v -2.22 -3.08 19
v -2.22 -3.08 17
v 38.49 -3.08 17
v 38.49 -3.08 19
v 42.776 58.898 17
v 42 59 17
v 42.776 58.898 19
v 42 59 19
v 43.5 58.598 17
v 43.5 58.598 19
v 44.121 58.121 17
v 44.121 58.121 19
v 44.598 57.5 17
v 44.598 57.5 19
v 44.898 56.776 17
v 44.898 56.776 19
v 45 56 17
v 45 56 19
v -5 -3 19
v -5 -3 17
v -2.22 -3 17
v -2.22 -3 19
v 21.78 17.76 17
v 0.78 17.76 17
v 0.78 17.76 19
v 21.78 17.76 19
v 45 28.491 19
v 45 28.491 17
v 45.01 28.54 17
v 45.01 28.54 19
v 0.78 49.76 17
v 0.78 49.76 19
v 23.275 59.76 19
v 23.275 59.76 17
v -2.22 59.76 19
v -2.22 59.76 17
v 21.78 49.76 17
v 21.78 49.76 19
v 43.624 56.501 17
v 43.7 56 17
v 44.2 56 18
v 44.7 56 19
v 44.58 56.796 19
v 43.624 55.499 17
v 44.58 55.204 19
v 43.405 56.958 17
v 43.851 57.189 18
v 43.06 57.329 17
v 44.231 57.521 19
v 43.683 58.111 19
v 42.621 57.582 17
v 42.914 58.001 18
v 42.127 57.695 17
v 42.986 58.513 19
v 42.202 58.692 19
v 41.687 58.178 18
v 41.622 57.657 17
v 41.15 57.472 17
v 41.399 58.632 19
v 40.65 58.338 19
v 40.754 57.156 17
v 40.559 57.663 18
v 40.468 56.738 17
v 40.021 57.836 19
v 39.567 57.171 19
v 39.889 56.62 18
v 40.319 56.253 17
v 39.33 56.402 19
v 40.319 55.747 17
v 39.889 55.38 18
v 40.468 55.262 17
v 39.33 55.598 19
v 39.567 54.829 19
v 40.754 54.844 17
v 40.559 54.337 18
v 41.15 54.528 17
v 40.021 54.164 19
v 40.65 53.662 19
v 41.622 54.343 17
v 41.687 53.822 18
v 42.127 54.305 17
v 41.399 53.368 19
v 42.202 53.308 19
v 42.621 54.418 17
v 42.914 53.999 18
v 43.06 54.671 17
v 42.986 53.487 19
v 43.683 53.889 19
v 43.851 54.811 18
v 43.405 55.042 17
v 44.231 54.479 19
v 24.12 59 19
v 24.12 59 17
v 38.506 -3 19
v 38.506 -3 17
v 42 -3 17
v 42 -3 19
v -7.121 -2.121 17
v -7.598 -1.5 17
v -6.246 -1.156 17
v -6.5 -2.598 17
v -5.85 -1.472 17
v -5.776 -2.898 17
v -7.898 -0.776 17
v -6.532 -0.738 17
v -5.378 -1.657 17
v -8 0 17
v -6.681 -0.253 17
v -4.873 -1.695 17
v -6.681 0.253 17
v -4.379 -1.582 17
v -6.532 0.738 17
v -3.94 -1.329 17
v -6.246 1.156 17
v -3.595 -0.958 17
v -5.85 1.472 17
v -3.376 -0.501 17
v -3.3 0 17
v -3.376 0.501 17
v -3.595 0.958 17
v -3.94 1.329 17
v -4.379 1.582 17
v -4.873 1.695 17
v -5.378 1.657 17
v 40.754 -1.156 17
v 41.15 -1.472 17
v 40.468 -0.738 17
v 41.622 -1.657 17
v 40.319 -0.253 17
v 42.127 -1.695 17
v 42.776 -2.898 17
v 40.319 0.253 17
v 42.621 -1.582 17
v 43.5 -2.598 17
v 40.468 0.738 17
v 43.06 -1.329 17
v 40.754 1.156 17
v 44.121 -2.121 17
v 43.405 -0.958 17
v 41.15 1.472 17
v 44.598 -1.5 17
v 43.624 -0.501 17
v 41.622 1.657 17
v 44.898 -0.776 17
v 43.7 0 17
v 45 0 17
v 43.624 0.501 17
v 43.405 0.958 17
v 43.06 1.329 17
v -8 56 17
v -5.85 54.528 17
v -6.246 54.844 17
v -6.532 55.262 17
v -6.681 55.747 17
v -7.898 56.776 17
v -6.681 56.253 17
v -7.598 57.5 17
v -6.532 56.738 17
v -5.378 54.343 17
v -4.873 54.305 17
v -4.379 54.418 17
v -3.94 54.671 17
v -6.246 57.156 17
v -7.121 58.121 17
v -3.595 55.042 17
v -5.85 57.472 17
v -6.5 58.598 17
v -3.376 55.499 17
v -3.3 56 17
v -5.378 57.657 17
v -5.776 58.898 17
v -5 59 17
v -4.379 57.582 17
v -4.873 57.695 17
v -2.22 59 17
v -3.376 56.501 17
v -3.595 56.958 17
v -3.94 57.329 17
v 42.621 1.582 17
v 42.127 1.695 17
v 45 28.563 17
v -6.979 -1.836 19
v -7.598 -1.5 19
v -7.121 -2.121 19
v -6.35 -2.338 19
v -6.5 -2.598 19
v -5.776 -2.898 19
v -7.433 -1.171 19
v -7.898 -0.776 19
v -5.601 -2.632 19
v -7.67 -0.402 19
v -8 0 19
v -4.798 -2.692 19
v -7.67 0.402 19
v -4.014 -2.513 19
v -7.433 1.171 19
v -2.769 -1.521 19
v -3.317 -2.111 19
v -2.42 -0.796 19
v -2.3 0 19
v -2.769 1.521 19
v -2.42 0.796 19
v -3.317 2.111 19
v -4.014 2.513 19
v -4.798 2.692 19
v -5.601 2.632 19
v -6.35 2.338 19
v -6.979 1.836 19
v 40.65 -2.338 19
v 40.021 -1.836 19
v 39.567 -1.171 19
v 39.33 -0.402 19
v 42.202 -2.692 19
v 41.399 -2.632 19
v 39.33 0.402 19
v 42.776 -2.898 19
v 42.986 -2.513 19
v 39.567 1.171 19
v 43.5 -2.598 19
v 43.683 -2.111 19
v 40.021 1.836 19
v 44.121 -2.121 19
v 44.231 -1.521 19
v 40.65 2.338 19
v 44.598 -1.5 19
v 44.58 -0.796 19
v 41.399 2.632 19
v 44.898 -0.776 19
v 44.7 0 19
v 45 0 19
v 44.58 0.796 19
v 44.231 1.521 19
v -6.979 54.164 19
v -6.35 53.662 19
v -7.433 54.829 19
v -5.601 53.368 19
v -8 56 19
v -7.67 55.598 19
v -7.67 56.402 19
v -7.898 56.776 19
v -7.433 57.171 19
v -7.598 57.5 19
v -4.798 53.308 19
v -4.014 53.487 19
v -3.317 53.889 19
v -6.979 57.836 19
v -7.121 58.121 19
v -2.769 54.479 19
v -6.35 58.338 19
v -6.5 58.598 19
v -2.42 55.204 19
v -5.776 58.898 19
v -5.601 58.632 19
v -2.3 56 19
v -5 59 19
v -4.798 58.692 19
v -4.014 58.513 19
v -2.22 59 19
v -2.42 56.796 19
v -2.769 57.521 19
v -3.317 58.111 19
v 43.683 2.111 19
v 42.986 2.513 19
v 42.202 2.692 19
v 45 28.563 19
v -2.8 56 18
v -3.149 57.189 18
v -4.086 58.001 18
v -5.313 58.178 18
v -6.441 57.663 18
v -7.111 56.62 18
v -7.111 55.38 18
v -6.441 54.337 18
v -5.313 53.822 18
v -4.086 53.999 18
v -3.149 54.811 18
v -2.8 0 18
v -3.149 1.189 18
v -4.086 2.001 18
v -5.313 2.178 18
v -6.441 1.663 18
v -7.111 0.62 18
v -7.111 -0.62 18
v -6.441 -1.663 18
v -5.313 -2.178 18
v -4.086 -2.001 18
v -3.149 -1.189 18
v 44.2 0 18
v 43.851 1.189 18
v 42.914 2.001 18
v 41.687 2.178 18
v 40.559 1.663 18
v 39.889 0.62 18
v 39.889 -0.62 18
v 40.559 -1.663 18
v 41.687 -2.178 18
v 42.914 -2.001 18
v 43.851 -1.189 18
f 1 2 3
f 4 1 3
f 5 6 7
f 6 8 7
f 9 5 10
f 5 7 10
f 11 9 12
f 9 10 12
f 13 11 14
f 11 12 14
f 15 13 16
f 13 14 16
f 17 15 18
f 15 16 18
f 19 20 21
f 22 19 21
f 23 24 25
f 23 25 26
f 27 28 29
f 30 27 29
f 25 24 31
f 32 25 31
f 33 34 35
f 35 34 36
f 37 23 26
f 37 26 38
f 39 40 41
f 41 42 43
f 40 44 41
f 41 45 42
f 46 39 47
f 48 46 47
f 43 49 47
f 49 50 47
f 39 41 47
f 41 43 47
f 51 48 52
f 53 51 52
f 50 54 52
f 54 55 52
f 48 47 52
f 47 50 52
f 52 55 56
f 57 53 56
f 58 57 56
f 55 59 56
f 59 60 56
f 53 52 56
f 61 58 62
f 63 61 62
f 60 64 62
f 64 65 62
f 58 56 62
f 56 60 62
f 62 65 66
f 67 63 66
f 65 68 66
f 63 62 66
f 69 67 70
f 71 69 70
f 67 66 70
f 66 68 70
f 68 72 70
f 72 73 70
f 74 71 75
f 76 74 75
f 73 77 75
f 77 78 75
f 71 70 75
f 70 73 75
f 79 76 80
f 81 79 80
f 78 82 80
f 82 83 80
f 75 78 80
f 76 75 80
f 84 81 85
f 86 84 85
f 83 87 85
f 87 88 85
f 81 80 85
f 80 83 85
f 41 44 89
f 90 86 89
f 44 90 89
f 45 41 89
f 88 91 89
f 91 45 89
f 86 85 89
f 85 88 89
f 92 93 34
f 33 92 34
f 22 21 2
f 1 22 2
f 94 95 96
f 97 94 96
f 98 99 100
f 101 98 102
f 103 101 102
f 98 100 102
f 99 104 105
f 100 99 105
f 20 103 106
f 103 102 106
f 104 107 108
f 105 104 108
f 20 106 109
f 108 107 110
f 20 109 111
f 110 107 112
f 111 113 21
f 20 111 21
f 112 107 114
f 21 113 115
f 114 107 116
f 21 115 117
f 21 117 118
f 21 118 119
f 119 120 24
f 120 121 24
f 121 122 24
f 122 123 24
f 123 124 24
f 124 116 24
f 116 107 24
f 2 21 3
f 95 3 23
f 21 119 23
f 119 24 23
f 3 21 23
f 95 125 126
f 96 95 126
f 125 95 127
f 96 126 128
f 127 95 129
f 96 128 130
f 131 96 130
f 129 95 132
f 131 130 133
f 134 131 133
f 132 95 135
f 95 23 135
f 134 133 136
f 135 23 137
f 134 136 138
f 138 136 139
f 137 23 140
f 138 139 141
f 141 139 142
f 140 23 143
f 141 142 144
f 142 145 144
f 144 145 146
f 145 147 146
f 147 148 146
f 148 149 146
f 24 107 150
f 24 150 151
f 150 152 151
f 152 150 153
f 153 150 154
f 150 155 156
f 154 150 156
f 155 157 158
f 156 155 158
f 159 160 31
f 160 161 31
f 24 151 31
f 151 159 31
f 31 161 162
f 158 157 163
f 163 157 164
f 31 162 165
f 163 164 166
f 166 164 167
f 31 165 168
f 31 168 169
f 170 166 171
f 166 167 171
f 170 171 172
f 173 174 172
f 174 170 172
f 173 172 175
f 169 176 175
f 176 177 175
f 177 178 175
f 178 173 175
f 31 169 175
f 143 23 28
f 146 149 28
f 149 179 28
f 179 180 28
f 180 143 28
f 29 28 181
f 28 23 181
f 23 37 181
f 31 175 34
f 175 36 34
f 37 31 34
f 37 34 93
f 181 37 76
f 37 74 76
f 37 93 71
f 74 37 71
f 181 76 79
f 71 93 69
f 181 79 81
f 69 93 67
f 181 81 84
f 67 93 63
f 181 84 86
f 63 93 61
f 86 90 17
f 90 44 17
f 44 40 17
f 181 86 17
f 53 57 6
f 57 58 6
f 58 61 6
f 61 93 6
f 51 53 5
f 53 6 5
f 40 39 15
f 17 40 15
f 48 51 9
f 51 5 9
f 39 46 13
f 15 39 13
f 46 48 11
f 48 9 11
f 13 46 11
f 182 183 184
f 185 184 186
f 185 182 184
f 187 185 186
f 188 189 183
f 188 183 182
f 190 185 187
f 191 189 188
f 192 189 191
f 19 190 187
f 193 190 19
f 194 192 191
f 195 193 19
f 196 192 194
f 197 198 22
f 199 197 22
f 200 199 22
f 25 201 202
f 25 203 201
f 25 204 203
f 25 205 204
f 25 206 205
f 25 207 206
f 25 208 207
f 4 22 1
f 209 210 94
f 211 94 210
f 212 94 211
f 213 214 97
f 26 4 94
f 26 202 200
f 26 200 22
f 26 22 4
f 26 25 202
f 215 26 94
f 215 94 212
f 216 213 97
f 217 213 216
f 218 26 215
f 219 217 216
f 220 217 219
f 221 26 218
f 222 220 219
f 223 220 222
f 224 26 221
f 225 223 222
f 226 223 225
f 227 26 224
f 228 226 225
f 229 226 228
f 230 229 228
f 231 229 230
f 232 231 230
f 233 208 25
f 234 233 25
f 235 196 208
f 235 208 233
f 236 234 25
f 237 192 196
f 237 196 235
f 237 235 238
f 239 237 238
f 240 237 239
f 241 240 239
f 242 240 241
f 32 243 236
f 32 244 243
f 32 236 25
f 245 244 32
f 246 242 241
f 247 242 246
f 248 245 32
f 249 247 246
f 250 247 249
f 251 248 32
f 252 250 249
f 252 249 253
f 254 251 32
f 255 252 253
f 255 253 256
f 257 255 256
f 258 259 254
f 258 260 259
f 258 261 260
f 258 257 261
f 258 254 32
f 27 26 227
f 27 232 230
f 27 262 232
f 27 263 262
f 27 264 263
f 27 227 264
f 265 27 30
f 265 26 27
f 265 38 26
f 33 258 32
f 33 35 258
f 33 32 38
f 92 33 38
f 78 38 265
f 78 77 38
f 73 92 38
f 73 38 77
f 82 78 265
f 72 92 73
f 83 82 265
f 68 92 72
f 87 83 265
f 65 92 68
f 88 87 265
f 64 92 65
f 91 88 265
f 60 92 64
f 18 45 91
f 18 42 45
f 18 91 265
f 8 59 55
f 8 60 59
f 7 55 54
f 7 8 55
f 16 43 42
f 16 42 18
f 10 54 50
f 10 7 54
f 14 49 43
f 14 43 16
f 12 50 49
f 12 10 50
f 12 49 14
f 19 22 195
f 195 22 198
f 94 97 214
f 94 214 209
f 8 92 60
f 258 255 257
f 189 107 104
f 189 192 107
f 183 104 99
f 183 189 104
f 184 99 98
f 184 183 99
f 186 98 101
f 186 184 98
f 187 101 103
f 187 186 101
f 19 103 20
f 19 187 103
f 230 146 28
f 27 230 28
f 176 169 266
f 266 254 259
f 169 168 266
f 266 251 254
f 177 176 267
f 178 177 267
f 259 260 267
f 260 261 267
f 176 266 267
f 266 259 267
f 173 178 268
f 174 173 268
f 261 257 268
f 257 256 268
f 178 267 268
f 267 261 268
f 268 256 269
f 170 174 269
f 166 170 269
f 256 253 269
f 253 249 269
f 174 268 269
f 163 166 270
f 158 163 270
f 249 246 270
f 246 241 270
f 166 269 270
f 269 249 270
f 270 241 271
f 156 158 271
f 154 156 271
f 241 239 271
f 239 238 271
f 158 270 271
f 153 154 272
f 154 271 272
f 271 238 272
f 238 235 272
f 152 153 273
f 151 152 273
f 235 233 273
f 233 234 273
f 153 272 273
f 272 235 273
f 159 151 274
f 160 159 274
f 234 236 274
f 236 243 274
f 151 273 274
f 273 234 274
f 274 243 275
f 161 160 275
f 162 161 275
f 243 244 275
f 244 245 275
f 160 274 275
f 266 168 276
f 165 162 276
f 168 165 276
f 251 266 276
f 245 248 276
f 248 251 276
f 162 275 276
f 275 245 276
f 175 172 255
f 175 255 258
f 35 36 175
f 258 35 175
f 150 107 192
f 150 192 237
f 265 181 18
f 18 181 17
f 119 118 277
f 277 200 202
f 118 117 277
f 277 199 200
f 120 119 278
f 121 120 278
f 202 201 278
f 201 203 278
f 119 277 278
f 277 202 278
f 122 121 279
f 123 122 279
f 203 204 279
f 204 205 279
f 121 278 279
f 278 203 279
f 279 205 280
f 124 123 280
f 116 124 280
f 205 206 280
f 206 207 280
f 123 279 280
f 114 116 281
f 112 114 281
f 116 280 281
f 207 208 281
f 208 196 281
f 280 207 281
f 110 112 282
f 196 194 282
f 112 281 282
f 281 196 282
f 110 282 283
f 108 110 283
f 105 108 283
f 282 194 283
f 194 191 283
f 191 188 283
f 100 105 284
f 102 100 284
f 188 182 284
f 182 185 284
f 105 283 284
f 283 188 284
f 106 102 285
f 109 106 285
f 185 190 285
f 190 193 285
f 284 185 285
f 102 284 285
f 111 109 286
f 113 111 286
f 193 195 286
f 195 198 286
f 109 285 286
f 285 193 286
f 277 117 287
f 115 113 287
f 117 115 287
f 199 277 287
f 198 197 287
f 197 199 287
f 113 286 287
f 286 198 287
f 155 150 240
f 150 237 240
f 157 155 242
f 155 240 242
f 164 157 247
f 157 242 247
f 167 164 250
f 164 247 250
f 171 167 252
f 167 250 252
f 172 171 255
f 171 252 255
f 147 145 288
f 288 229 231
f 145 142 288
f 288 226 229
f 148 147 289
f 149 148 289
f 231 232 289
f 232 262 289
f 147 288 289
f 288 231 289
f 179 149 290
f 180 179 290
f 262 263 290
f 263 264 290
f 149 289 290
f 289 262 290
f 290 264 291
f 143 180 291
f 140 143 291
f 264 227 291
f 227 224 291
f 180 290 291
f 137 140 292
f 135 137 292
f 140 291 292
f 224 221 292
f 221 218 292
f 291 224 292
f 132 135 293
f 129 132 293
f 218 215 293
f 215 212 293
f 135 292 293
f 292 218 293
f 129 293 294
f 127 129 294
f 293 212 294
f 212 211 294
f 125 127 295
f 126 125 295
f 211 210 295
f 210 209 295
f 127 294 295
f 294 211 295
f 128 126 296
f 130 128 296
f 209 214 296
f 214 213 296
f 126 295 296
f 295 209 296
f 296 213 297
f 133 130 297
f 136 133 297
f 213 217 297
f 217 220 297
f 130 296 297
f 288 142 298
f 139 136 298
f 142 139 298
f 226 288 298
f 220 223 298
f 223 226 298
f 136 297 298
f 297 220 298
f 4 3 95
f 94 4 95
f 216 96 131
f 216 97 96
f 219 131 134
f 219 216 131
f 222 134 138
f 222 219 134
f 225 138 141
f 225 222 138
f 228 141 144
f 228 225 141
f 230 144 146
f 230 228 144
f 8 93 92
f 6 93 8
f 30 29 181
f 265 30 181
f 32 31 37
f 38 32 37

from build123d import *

# Parameters (mm, degrees)
CYLINDER003_R     = 3.4
CYLINDER003_DEPTH = 10
CYLINDER004_R     = 1.7
CYLINDER004_DEPTH = 9.6
CYLINDER002_R     = 3.4
CYLINDER002_DEPTH = 10
CYLINDER001_R     = 1.7
CYLINDER001_DEPTH = 9.6
CYLINDER008_R     = 3.4
CYLINDER008_DEPTH = 10
CYLINDER006_R     = 1.7
CYLINDER006_DEPTH = 9.6
CYLINDER005_R     = 3.4
CYLINDER005_DEPTH = 10
CYLINDER007_R     = 1.7
CYLINDER007_DEPTH = 9.6
PAD002_DEPTH      = 2
BOX001_W          = 53
BOX001_H          = 62
BOX001_DEPTH      = 2
FILLET_R          = 3
SKETCH001_W       = 21
SKETCH001_H       = 32
PAD001_DEPTH      = 2


with BuildPart() as grab_screw_head001:
    # Cone002 → Cone002 (revolve)
    with BuildSketch(Plane.XZ):
        Polygon((0, 0), (1.7, 0), (3.4, 3.4), (0, 3.4), align=None)
    revolve(axis=Axis((0, 0, 0), (0, 0, 1)))


with BuildPart() as grab_screw_head_extension001:
    # Cylinder003 → Cylinder003 (new body)
    with BuildSketch(Plane.XY.offset(3.4)):
        Circle(CYLINDER003_R)
    extrude(amount=CYLINDER003_DEPTH)


with BuildPart() as grab_screw001:
    # Cylinder004 → Cylinder004 (new body)
    with BuildSketch(Plane.XY.offset(-9.6)):
        Circle(CYLINDER004_R)
    extrude(amount=CYLINDER004_DEPTH)

    # Fusion002: union grab-screw-head001, grab-screw-head-extension001
    add(grab_screw_head001.part)
    add(grab_screw_head_extension001.part)


with BuildPart() as grab_screw001_1:
    # Fusion002 placement: moved
    add(grab_screw001.part.moved(Location((42, 56, 5))))


with BuildPart() as grab_screw_head:
    # Cone001 → Cone001 (revolve)
    with BuildSketch(Plane.XZ):
        Polygon((0, 0), (1.7, 0), (3.4, 3.4), (0, 3.4), align=None)
    revolve(axis=Axis((0, 0, 0), (0, 0, 1)))


with BuildPart() as grab_screw_head_extension:
    # Cylinder002 → Cylinder002 (new body)
    with BuildSketch(Plane.XY.offset(3.4)):
        Circle(CYLINDER002_R)
    extrude(amount=CYLINDER002_DEPTH)


with BuildPart() as right_screws:
    # Cylinder001 → Cylinder001 (new body)
    with BuildSketch(Plane.XY.offset(-9.6)):
        Circle(CYLINDER001_R)
    extrude(amount=CYLINDER001_DEPTH)

    # Fusion001: union grab-screw-head, grab-screw-head-extension
    add(grab_screw_head.part)
    add(grab_screw_head_extension.part)


with BuildPart() as right_screws_1:
    # Fusion001 placement: moved
    add(right_screws.part.moved(Location((42, 0, 5))))

    # Fusion: union grab-screw001
    add(grab_screw001_1.part)


with BuildPart() as grab_screw_head003:
    # Cone004 → Cone004 (revolve)
    with BuildSketch(Plane.XZ):
        Polygon((0, 0), (1.7, 0), (3.4, 3.4), (0, 3.4), align=None)
    revolve(axis=Axis((0, 0, 0), (0, 0, 1)))


with BuildPart() as grab_screw_head_extension003:
    # Cylinder008 → Cylinder008 (new body)
    with BuildSketch(Plane.XY.offset(3.4)):
        Circle(CYLINDER008_R)
    extrude(amount=CYLINDER008_DEPTH)


with BuildPart() as grab_screw002:
    # Cylinder006 → Cylinder006 (new body)
    with BuildSketch(Plane.XY.offset(-9.6)):
        Circle(CYLINDER006_R)
    extrude(amount=CYLINDER006_DEPTH)

    # Fusion004: union grab-screw-head003, grab-screw-head-extension003
    add(grab_screw_head003.part)
    add(grab_screw_head_extension003.part)


with BuildPart() as grab_screw002_1:
    # Fusion004 placement: moved
    add(grab_screw002.part.moved(Location((42, 56, 5))))


with BuildPart() as grab_screw_head002:
    # Cone003 → Cone003 (revolve)
    with BuildSketch(Plane.XZ):
        Polygon((0, 0), (1.7, 0), (3.4, 3.4), (0, 3.4), align=None)
    revolve(axis=Axis((0, 0, 0), (0, 0, 1)))


with BuildPart() as grab_screw_head_extension002:
    # Cylinder005 → Cylinder005 (new body)
    with BuildSketch(Plane.XY.offset(3.4)):
        Circle(CYLINDER005_R)
    extrude(amount=CYLINDER005_DEPTH)


with BuildPart() as all_screws:
    # Cylinder007 → Cylinder007 (new body)
    with BuildSketch(Plane.XY.offset(-9.6)):
        Circle(CYLINDER007_R)
    extrude(amount=CYLINDER007_DEPTH)

    # Fusion005: union grab-screw-head002, grab-screw-head-extension002
    add(grab_screw_head002.part)
    add(grab_screw_head_extension002.part)


with BuildPart() as all_screws_1:
    # Fusion005 placement: moved
    add(all_screws.part.moved(Location((42, 0, 5))))

    # Fusion003: union grab-screw002
    add(grab_screw002_1.part)


with BuildPart() as all_screws_2:
    # Fusion003 placement: moved
    add(all_screws_1.part.moved(Location((-47, 0, 0))))

    # Fusion006: union right-screws
    add(right_screws_1.part)


with BuildPart() as all_screws_3:
    # Fusion006 placement: moved
    add(all_screws_2.part.moved(Location((0, 0, 12))))


with BuildPart() as compound:
    # Sketch002 → Pad002 (new body)
    with BuildSketch(Plane.XY):
        Polygon((-2.215162, 59.759811), (-2.215162, -3.075415), (38.48941, -3.075415), (45.010048, 28.539799), (36.908657, 47.508923), (23.274607, 59.759811), align=None)
    extrude(amount=PAD002_DEPTH)


with BuildPart() as compound_1:
    # Compound placement: moved
    add(compound.part.moved(Location((0, 0, 20))))


with BuildPart() as fillet_body:
    # Box001 → Box001 (new body)
    with BuildSketch(Plane(origin=(-8, -3, 20), x_dir=(1, 0, 0), z_dir=(0, 0, 1))):
        with Locations((26.5, 31)):
            Rectangle(BOX001_W, BOX001_H)
    extrude(amount=BOX001_DEPTH)

    # Cut: cut Compound
    add(compound_1.part, mode=Mode.SUBTRACT)


with BuildPart() as fillet_body_1:
    # Cut placement: moved
    add(fillet_body.part.moved(Location((0, 0, -22))))

    # Fillet
    fillet_edges = [fillet_body_1.edges().sort_by_distance(p)[0] for p in [
        (-8, -3, -1),
        (-8, 59, -1),
        (45, -3, -1),
        (45, 59, -1),
    ]]
    fillet(fillet_edges, radius=FILLET_R)


with BuildPart() as top_flat:
    # Sketch001 → Pad001 (new body)
    with BuildSketch(Plane.XY):
        Polygon((-2.22, 59.76), (-2.22, -3.08), (38.49, -3.08), (45.010048, 28.539799), (36.908657, 47.508923), (23.274607, 59.76), align=None)
        with Locations((11.28, 33.76)):
            Rectangle(SKETCH001_W, SKETCH001_H, mode=Mode.SUBTRACT)
    extrude(amount=PAD001_DEPTH)


with BuildPart() as top_flat_1:
    # Body001 placement: moved
    add(top_flat.part.moved(Location((0, 0, -2))))

    # Fusion010: union Fillet body
    add(fillet_body_1.part)


with BuildPart() as top_flat_2:
    # Fusion010 placement: moved
    add(top_flat_1.part.moved(Location((0, 0, 19))))

    # Cut001: cut all-screws
    add(all_screws_3.part, mode=Mode.SUBTRACT)


solid = top_flat_2.part
